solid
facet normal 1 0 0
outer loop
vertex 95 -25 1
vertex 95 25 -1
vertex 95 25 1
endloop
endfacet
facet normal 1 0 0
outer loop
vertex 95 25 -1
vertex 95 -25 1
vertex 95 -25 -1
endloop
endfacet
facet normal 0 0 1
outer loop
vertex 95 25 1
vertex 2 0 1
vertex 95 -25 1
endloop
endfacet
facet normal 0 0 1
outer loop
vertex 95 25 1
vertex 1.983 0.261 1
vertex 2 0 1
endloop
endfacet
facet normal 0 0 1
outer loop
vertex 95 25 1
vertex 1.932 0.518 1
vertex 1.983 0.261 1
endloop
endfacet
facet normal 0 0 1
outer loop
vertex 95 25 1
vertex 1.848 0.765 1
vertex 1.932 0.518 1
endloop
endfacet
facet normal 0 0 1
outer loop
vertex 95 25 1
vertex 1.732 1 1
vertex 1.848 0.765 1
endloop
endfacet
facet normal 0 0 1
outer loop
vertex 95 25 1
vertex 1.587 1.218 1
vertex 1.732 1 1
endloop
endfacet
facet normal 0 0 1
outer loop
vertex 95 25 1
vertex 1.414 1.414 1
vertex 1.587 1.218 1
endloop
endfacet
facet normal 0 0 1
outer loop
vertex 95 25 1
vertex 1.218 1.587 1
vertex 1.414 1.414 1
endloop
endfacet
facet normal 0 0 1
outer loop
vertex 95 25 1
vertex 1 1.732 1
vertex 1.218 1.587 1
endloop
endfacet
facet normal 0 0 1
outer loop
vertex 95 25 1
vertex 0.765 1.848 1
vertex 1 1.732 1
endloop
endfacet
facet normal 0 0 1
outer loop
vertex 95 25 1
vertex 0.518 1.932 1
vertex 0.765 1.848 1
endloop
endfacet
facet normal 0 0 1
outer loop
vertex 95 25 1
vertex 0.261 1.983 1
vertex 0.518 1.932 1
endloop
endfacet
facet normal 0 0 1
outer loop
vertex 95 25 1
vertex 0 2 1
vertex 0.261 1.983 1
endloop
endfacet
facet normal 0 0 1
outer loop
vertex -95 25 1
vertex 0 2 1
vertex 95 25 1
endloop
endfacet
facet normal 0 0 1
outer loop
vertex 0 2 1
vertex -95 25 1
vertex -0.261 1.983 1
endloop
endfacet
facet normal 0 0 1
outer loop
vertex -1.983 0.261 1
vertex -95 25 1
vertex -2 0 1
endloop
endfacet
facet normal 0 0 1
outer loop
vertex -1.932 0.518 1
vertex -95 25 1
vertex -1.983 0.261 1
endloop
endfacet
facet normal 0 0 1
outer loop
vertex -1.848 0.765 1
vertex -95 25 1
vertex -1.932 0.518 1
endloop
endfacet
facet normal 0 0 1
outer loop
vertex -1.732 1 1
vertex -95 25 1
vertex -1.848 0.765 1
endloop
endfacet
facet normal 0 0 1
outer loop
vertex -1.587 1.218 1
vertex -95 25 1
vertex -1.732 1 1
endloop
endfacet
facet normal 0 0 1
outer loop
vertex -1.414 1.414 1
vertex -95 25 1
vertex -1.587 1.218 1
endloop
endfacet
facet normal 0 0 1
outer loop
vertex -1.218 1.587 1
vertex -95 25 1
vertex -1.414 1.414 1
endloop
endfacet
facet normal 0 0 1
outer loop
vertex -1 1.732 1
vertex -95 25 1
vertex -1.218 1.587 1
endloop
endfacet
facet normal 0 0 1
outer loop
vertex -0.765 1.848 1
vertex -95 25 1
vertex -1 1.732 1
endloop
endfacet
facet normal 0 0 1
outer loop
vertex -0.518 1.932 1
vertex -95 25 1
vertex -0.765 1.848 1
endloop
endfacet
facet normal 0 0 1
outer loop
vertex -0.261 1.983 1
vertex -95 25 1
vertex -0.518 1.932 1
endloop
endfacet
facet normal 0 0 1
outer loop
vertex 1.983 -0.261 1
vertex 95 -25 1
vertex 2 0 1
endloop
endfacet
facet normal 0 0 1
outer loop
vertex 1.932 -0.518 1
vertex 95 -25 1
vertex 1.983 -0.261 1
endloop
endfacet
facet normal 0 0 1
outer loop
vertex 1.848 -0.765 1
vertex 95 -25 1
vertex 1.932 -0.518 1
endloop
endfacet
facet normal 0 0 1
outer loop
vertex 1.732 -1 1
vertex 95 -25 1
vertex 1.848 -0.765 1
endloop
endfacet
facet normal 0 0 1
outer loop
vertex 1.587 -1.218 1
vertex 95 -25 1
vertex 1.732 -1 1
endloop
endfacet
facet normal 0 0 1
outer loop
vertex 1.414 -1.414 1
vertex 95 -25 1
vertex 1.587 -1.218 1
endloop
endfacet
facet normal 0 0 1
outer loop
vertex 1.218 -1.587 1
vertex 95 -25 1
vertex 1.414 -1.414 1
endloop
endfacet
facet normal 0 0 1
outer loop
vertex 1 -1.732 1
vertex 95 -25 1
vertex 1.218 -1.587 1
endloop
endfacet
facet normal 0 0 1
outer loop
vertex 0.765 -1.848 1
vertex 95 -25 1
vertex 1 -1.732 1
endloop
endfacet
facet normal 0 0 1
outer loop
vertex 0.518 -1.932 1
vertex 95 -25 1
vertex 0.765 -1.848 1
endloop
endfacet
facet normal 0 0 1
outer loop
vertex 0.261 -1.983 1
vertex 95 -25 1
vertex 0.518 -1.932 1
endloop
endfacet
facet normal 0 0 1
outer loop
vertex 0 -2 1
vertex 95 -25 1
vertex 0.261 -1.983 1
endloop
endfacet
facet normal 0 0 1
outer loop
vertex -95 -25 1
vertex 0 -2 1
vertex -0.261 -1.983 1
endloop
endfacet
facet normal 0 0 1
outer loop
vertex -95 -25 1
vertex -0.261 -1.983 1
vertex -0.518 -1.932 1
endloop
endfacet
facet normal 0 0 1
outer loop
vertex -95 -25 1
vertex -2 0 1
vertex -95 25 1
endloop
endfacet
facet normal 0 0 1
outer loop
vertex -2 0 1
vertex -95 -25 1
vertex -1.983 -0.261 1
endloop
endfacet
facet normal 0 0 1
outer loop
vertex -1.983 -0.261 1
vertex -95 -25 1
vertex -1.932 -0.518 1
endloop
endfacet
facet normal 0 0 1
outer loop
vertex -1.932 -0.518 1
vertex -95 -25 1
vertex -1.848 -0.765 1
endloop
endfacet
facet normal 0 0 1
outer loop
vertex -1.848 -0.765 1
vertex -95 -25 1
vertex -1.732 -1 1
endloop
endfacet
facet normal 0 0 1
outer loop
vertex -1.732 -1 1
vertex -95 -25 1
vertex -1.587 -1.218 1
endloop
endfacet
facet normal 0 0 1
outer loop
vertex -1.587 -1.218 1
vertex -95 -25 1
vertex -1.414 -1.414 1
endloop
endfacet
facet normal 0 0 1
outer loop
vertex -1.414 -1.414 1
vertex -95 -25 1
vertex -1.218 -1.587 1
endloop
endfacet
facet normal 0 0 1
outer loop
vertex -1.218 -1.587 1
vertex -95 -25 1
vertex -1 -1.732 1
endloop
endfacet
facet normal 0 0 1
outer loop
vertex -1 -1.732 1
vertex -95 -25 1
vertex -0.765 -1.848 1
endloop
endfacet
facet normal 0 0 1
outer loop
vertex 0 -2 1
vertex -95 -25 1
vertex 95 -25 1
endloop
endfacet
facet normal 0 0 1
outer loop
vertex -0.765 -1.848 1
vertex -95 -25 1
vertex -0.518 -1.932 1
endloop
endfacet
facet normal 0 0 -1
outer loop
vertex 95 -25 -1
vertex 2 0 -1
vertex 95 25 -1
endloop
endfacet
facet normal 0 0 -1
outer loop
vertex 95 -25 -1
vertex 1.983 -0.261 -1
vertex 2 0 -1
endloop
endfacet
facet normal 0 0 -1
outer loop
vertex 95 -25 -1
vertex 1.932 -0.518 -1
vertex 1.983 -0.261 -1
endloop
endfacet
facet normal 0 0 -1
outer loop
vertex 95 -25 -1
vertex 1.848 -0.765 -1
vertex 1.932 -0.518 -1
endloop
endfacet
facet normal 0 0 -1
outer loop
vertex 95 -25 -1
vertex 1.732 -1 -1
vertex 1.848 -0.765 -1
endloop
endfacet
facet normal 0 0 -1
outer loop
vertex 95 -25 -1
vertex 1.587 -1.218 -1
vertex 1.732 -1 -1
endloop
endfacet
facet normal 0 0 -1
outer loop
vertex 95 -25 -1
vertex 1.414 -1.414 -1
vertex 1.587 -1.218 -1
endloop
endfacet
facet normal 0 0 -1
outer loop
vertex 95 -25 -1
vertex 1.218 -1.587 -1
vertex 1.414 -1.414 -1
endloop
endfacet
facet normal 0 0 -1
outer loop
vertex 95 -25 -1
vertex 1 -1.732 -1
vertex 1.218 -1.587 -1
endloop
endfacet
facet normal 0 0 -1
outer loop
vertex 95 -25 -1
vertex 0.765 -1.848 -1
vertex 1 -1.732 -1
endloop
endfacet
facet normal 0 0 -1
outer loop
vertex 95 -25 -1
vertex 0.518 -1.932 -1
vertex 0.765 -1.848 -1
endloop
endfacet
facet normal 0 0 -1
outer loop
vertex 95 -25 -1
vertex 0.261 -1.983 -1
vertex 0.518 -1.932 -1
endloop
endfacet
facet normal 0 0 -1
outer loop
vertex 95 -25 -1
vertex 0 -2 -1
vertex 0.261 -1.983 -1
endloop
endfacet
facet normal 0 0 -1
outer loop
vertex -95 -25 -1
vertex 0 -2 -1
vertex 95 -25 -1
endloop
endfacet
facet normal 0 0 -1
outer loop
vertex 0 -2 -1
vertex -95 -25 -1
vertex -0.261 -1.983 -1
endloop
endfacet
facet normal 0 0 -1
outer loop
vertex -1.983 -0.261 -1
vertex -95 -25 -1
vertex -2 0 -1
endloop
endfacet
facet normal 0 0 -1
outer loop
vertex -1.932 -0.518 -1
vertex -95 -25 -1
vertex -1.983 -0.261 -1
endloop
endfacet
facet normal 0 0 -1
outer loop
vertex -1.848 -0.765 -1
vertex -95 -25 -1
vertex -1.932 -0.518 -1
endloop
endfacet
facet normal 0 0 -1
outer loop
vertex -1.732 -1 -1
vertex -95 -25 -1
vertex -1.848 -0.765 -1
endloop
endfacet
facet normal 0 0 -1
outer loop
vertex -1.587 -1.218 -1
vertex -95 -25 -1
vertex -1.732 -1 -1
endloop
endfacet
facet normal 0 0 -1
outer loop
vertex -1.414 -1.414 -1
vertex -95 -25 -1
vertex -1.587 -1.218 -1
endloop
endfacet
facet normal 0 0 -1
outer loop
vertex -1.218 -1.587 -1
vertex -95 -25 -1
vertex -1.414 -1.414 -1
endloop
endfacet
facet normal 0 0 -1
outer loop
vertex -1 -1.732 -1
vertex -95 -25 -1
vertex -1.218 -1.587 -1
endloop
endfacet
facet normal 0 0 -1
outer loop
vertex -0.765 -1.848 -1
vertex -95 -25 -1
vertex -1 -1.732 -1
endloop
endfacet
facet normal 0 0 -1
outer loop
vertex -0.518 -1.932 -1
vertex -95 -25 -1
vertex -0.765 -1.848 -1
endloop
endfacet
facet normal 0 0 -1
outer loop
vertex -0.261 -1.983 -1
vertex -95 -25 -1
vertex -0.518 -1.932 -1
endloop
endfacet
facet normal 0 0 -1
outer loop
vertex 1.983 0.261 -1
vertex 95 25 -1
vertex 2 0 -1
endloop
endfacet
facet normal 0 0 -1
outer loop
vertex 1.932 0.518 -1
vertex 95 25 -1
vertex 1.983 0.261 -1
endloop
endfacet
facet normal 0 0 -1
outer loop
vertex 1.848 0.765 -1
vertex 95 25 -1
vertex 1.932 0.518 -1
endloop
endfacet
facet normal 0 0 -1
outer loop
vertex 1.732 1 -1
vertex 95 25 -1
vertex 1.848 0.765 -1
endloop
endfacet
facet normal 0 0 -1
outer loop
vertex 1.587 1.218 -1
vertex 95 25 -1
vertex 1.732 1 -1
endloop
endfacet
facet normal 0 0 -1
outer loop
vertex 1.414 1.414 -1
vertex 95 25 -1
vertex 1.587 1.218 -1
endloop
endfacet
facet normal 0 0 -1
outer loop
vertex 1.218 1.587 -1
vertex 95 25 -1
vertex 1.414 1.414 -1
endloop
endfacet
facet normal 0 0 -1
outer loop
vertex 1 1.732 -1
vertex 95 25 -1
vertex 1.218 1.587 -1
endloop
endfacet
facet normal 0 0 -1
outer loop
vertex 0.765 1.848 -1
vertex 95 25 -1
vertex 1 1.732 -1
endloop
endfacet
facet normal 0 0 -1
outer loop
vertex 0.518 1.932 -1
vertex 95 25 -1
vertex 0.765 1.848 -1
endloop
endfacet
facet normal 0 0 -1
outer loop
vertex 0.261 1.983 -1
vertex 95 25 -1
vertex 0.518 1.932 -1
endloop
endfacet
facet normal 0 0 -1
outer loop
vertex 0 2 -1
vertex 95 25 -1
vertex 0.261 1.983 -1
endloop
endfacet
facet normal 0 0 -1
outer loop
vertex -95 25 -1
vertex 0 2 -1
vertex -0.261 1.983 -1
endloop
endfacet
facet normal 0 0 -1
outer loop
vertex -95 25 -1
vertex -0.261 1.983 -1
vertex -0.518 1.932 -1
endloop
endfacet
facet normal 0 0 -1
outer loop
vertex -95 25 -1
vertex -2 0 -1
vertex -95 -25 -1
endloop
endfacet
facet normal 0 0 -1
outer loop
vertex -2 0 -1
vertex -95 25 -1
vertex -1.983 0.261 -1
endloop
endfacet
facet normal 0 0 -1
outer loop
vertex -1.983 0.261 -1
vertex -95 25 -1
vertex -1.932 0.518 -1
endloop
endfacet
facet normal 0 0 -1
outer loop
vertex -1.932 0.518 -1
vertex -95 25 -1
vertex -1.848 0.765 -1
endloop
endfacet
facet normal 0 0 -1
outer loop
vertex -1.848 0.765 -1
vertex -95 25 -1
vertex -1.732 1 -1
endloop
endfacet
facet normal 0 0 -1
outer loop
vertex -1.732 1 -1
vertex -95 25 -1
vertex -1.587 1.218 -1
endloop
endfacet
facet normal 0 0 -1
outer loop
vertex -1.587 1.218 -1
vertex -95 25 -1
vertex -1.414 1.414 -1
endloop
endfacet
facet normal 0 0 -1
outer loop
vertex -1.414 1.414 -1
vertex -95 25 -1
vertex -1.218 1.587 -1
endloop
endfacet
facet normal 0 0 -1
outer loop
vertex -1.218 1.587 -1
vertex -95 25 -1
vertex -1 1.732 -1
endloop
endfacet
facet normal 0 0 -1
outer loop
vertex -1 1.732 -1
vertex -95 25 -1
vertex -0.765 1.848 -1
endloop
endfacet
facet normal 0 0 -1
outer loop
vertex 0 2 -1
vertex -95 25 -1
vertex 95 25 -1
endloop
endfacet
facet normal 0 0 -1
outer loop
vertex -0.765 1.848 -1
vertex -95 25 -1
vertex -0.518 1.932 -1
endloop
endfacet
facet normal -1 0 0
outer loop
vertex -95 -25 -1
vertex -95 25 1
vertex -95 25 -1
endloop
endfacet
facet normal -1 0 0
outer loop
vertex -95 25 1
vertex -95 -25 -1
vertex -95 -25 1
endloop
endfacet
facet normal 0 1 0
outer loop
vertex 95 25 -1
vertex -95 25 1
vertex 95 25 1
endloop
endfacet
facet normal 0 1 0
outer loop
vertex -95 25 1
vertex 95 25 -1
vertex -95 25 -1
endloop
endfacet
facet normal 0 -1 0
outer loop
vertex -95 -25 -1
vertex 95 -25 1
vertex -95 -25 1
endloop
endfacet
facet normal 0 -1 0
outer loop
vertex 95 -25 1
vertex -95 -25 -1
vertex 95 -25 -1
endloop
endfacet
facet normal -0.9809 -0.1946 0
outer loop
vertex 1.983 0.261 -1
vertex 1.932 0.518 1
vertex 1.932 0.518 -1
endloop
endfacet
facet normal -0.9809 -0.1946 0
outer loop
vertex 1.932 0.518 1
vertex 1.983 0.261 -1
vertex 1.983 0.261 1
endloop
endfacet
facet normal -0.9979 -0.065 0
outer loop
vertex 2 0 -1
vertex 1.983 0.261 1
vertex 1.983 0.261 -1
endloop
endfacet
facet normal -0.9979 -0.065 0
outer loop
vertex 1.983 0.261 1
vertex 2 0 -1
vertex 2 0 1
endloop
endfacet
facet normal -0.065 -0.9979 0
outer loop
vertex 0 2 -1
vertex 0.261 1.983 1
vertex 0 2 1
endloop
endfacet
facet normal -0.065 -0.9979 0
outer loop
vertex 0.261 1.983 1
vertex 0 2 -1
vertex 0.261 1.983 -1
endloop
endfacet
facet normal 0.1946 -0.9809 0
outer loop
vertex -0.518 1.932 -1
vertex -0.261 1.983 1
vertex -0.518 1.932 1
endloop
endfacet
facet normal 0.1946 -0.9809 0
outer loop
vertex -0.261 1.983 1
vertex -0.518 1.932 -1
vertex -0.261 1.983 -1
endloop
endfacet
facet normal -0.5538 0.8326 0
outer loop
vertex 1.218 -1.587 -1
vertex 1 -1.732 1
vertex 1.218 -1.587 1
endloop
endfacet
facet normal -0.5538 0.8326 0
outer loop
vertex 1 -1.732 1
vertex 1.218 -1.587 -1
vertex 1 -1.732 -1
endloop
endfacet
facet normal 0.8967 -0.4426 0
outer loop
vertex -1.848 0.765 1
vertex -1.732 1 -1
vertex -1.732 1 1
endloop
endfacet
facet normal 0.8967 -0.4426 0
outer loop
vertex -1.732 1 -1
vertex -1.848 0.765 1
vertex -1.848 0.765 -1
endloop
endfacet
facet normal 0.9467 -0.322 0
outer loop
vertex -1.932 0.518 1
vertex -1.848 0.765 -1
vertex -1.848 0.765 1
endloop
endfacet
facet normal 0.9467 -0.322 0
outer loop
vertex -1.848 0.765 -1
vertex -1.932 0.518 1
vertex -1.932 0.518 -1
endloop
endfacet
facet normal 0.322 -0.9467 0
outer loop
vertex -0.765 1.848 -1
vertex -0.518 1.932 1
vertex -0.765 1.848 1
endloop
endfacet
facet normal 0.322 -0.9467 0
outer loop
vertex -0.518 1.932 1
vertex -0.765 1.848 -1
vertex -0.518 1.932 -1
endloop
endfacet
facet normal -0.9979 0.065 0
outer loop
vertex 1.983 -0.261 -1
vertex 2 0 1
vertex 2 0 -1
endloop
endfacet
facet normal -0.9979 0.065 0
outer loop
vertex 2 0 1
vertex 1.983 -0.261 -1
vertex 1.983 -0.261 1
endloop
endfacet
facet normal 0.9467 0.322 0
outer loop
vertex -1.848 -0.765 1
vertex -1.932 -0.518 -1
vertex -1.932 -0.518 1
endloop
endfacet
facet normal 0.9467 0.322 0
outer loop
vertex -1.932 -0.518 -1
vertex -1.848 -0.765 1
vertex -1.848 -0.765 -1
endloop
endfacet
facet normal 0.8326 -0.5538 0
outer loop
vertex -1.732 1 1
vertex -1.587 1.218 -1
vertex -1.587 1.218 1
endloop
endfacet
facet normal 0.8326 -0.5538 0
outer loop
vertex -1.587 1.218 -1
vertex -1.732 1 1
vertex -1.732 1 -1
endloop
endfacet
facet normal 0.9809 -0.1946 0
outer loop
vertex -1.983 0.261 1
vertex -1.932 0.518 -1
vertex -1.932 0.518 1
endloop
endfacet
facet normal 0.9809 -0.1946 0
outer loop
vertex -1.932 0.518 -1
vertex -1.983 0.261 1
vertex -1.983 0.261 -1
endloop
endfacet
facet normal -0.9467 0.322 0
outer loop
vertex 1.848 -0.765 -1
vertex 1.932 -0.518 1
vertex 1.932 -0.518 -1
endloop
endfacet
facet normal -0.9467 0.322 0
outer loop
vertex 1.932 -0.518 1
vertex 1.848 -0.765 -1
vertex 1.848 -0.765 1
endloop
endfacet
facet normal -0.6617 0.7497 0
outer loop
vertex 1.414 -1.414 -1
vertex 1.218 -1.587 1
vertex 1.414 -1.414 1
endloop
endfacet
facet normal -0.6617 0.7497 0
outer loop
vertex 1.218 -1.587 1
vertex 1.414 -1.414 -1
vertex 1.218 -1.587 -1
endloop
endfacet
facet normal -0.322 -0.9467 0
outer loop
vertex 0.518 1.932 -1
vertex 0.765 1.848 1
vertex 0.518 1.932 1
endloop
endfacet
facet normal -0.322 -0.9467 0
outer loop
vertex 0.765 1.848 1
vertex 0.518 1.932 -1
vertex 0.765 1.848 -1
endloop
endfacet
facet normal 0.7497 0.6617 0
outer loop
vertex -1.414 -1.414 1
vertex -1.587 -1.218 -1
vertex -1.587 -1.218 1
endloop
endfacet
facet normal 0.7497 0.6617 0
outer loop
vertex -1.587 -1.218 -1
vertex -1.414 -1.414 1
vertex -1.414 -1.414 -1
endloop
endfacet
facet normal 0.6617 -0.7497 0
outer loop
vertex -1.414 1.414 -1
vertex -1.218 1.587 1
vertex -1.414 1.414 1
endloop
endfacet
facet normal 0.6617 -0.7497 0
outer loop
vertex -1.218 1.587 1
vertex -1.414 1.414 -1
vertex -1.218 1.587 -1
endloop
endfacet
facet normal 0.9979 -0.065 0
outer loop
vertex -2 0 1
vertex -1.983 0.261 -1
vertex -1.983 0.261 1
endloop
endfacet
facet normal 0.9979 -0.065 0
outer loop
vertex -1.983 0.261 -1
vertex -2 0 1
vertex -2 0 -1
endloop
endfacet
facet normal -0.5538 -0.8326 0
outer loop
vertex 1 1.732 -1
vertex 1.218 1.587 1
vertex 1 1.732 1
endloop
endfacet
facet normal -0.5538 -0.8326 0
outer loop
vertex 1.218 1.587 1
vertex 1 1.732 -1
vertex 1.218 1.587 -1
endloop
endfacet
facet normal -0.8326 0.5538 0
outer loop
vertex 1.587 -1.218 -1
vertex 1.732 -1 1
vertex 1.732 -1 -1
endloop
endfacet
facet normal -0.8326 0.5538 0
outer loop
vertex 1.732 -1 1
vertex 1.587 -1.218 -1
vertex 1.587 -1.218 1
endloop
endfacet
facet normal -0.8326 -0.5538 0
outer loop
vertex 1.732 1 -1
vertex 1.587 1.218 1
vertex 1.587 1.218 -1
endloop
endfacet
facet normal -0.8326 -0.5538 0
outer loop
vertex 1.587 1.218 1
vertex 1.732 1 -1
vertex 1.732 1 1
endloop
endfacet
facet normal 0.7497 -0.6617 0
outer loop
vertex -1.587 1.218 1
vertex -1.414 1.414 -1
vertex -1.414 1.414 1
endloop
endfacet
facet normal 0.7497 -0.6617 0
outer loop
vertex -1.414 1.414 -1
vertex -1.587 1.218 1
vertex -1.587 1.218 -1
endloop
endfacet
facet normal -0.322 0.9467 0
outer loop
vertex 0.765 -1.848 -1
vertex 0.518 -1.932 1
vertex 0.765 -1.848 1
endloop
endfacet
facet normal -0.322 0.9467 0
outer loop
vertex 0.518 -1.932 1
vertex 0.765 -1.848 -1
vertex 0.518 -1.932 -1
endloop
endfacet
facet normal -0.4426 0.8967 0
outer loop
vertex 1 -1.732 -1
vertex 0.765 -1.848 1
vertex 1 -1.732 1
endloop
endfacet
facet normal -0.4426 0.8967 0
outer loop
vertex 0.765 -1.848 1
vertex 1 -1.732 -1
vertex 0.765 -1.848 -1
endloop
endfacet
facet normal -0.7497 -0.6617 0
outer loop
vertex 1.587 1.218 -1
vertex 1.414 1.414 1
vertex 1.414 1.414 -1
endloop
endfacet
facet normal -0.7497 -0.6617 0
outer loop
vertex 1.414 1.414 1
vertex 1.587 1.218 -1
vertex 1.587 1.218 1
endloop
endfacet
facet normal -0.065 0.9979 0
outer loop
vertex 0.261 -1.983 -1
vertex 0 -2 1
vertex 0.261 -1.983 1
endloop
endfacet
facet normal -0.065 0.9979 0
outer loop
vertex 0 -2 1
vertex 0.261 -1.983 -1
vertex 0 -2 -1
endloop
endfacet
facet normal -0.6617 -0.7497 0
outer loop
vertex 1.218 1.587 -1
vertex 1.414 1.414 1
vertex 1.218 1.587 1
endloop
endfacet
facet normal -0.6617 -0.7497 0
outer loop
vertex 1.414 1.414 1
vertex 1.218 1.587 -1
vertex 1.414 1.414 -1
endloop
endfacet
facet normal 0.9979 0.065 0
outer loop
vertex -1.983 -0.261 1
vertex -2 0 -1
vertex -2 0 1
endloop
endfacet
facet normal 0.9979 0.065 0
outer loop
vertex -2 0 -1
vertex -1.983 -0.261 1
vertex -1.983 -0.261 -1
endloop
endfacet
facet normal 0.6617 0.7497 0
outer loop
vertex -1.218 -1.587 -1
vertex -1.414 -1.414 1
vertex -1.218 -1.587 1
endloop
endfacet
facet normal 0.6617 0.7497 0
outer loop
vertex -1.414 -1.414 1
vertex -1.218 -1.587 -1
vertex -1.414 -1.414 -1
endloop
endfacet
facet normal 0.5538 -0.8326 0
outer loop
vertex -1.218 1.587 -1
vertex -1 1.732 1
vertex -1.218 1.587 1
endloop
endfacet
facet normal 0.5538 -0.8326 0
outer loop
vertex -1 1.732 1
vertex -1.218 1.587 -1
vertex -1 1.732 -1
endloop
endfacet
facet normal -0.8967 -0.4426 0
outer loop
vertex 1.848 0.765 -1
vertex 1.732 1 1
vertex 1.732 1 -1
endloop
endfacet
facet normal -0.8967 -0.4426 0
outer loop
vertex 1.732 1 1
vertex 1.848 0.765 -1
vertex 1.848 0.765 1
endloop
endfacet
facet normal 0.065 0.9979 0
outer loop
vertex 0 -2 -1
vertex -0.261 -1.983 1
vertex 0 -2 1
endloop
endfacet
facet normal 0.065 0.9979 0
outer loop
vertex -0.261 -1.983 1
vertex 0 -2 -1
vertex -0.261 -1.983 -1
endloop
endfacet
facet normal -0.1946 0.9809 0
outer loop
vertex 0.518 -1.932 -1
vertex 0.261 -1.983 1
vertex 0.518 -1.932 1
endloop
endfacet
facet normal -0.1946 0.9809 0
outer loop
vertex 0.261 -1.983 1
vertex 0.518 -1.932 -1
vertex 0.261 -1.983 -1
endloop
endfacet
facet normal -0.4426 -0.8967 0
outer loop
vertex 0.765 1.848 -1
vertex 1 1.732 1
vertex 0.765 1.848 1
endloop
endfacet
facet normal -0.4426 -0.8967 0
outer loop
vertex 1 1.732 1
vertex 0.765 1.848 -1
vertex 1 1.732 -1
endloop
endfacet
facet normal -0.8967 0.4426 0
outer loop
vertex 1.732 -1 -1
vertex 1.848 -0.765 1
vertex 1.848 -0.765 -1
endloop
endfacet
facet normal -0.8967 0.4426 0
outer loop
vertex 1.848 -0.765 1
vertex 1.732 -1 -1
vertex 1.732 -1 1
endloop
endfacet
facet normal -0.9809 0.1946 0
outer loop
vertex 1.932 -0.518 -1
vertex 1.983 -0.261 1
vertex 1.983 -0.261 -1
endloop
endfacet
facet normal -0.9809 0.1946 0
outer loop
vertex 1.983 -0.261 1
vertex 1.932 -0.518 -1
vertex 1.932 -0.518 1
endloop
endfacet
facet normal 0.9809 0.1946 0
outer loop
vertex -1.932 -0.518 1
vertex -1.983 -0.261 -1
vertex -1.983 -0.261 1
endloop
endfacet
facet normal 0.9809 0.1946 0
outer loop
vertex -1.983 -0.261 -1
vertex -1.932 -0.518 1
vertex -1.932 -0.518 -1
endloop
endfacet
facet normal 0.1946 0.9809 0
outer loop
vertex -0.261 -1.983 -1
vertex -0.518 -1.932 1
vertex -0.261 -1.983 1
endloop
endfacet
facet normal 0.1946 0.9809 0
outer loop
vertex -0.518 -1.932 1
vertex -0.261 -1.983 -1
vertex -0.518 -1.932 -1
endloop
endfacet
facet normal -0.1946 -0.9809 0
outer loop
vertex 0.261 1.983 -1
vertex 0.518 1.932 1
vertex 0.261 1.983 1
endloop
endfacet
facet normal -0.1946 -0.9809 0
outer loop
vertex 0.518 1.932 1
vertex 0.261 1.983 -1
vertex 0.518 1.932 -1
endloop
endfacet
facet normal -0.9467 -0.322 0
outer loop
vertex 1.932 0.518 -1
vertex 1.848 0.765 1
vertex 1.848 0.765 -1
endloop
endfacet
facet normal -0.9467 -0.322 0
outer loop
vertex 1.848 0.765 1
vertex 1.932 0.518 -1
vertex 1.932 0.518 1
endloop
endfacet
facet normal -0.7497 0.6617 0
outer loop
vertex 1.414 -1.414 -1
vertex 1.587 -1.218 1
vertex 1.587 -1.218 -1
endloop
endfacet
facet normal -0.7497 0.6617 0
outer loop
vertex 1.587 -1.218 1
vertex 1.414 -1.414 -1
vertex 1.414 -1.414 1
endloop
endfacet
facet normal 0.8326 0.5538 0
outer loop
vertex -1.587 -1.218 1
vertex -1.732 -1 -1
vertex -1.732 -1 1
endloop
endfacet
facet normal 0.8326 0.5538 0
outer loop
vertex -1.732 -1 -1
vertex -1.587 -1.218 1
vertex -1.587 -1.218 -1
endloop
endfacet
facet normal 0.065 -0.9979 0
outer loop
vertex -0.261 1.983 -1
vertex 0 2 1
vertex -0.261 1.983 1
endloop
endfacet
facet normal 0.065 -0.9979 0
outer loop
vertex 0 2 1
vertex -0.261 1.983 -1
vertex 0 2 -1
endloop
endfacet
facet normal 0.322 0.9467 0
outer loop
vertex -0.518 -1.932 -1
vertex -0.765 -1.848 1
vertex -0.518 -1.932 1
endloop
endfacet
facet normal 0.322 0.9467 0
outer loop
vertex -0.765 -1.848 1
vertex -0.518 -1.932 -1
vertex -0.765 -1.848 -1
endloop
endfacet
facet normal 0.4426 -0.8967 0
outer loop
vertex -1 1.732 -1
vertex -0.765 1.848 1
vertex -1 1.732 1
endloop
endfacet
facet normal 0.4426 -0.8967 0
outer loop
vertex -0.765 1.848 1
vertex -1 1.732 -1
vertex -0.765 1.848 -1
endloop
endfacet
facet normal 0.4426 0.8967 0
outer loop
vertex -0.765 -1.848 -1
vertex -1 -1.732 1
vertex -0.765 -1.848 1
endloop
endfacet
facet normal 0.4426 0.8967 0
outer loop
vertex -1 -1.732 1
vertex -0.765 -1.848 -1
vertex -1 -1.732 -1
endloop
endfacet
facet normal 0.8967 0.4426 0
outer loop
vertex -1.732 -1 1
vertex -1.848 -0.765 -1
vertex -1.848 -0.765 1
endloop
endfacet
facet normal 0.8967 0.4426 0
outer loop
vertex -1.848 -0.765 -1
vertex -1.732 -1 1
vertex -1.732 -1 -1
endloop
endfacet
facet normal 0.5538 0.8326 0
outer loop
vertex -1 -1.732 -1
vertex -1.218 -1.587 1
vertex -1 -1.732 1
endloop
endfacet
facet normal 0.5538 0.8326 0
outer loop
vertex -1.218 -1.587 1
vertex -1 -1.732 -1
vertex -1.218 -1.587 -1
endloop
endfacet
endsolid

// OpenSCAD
// ========================================
// a 190 x 50 x 2 mm plate with one 4 mm holes
// NeuroCAD canonical IR; dimensions are millimetres
// ========================================
$fn = 48;

difference() {
  cube(size=[190, 50, 2], center=true);
  cylinder(r=2, h=4, center=true);
}
